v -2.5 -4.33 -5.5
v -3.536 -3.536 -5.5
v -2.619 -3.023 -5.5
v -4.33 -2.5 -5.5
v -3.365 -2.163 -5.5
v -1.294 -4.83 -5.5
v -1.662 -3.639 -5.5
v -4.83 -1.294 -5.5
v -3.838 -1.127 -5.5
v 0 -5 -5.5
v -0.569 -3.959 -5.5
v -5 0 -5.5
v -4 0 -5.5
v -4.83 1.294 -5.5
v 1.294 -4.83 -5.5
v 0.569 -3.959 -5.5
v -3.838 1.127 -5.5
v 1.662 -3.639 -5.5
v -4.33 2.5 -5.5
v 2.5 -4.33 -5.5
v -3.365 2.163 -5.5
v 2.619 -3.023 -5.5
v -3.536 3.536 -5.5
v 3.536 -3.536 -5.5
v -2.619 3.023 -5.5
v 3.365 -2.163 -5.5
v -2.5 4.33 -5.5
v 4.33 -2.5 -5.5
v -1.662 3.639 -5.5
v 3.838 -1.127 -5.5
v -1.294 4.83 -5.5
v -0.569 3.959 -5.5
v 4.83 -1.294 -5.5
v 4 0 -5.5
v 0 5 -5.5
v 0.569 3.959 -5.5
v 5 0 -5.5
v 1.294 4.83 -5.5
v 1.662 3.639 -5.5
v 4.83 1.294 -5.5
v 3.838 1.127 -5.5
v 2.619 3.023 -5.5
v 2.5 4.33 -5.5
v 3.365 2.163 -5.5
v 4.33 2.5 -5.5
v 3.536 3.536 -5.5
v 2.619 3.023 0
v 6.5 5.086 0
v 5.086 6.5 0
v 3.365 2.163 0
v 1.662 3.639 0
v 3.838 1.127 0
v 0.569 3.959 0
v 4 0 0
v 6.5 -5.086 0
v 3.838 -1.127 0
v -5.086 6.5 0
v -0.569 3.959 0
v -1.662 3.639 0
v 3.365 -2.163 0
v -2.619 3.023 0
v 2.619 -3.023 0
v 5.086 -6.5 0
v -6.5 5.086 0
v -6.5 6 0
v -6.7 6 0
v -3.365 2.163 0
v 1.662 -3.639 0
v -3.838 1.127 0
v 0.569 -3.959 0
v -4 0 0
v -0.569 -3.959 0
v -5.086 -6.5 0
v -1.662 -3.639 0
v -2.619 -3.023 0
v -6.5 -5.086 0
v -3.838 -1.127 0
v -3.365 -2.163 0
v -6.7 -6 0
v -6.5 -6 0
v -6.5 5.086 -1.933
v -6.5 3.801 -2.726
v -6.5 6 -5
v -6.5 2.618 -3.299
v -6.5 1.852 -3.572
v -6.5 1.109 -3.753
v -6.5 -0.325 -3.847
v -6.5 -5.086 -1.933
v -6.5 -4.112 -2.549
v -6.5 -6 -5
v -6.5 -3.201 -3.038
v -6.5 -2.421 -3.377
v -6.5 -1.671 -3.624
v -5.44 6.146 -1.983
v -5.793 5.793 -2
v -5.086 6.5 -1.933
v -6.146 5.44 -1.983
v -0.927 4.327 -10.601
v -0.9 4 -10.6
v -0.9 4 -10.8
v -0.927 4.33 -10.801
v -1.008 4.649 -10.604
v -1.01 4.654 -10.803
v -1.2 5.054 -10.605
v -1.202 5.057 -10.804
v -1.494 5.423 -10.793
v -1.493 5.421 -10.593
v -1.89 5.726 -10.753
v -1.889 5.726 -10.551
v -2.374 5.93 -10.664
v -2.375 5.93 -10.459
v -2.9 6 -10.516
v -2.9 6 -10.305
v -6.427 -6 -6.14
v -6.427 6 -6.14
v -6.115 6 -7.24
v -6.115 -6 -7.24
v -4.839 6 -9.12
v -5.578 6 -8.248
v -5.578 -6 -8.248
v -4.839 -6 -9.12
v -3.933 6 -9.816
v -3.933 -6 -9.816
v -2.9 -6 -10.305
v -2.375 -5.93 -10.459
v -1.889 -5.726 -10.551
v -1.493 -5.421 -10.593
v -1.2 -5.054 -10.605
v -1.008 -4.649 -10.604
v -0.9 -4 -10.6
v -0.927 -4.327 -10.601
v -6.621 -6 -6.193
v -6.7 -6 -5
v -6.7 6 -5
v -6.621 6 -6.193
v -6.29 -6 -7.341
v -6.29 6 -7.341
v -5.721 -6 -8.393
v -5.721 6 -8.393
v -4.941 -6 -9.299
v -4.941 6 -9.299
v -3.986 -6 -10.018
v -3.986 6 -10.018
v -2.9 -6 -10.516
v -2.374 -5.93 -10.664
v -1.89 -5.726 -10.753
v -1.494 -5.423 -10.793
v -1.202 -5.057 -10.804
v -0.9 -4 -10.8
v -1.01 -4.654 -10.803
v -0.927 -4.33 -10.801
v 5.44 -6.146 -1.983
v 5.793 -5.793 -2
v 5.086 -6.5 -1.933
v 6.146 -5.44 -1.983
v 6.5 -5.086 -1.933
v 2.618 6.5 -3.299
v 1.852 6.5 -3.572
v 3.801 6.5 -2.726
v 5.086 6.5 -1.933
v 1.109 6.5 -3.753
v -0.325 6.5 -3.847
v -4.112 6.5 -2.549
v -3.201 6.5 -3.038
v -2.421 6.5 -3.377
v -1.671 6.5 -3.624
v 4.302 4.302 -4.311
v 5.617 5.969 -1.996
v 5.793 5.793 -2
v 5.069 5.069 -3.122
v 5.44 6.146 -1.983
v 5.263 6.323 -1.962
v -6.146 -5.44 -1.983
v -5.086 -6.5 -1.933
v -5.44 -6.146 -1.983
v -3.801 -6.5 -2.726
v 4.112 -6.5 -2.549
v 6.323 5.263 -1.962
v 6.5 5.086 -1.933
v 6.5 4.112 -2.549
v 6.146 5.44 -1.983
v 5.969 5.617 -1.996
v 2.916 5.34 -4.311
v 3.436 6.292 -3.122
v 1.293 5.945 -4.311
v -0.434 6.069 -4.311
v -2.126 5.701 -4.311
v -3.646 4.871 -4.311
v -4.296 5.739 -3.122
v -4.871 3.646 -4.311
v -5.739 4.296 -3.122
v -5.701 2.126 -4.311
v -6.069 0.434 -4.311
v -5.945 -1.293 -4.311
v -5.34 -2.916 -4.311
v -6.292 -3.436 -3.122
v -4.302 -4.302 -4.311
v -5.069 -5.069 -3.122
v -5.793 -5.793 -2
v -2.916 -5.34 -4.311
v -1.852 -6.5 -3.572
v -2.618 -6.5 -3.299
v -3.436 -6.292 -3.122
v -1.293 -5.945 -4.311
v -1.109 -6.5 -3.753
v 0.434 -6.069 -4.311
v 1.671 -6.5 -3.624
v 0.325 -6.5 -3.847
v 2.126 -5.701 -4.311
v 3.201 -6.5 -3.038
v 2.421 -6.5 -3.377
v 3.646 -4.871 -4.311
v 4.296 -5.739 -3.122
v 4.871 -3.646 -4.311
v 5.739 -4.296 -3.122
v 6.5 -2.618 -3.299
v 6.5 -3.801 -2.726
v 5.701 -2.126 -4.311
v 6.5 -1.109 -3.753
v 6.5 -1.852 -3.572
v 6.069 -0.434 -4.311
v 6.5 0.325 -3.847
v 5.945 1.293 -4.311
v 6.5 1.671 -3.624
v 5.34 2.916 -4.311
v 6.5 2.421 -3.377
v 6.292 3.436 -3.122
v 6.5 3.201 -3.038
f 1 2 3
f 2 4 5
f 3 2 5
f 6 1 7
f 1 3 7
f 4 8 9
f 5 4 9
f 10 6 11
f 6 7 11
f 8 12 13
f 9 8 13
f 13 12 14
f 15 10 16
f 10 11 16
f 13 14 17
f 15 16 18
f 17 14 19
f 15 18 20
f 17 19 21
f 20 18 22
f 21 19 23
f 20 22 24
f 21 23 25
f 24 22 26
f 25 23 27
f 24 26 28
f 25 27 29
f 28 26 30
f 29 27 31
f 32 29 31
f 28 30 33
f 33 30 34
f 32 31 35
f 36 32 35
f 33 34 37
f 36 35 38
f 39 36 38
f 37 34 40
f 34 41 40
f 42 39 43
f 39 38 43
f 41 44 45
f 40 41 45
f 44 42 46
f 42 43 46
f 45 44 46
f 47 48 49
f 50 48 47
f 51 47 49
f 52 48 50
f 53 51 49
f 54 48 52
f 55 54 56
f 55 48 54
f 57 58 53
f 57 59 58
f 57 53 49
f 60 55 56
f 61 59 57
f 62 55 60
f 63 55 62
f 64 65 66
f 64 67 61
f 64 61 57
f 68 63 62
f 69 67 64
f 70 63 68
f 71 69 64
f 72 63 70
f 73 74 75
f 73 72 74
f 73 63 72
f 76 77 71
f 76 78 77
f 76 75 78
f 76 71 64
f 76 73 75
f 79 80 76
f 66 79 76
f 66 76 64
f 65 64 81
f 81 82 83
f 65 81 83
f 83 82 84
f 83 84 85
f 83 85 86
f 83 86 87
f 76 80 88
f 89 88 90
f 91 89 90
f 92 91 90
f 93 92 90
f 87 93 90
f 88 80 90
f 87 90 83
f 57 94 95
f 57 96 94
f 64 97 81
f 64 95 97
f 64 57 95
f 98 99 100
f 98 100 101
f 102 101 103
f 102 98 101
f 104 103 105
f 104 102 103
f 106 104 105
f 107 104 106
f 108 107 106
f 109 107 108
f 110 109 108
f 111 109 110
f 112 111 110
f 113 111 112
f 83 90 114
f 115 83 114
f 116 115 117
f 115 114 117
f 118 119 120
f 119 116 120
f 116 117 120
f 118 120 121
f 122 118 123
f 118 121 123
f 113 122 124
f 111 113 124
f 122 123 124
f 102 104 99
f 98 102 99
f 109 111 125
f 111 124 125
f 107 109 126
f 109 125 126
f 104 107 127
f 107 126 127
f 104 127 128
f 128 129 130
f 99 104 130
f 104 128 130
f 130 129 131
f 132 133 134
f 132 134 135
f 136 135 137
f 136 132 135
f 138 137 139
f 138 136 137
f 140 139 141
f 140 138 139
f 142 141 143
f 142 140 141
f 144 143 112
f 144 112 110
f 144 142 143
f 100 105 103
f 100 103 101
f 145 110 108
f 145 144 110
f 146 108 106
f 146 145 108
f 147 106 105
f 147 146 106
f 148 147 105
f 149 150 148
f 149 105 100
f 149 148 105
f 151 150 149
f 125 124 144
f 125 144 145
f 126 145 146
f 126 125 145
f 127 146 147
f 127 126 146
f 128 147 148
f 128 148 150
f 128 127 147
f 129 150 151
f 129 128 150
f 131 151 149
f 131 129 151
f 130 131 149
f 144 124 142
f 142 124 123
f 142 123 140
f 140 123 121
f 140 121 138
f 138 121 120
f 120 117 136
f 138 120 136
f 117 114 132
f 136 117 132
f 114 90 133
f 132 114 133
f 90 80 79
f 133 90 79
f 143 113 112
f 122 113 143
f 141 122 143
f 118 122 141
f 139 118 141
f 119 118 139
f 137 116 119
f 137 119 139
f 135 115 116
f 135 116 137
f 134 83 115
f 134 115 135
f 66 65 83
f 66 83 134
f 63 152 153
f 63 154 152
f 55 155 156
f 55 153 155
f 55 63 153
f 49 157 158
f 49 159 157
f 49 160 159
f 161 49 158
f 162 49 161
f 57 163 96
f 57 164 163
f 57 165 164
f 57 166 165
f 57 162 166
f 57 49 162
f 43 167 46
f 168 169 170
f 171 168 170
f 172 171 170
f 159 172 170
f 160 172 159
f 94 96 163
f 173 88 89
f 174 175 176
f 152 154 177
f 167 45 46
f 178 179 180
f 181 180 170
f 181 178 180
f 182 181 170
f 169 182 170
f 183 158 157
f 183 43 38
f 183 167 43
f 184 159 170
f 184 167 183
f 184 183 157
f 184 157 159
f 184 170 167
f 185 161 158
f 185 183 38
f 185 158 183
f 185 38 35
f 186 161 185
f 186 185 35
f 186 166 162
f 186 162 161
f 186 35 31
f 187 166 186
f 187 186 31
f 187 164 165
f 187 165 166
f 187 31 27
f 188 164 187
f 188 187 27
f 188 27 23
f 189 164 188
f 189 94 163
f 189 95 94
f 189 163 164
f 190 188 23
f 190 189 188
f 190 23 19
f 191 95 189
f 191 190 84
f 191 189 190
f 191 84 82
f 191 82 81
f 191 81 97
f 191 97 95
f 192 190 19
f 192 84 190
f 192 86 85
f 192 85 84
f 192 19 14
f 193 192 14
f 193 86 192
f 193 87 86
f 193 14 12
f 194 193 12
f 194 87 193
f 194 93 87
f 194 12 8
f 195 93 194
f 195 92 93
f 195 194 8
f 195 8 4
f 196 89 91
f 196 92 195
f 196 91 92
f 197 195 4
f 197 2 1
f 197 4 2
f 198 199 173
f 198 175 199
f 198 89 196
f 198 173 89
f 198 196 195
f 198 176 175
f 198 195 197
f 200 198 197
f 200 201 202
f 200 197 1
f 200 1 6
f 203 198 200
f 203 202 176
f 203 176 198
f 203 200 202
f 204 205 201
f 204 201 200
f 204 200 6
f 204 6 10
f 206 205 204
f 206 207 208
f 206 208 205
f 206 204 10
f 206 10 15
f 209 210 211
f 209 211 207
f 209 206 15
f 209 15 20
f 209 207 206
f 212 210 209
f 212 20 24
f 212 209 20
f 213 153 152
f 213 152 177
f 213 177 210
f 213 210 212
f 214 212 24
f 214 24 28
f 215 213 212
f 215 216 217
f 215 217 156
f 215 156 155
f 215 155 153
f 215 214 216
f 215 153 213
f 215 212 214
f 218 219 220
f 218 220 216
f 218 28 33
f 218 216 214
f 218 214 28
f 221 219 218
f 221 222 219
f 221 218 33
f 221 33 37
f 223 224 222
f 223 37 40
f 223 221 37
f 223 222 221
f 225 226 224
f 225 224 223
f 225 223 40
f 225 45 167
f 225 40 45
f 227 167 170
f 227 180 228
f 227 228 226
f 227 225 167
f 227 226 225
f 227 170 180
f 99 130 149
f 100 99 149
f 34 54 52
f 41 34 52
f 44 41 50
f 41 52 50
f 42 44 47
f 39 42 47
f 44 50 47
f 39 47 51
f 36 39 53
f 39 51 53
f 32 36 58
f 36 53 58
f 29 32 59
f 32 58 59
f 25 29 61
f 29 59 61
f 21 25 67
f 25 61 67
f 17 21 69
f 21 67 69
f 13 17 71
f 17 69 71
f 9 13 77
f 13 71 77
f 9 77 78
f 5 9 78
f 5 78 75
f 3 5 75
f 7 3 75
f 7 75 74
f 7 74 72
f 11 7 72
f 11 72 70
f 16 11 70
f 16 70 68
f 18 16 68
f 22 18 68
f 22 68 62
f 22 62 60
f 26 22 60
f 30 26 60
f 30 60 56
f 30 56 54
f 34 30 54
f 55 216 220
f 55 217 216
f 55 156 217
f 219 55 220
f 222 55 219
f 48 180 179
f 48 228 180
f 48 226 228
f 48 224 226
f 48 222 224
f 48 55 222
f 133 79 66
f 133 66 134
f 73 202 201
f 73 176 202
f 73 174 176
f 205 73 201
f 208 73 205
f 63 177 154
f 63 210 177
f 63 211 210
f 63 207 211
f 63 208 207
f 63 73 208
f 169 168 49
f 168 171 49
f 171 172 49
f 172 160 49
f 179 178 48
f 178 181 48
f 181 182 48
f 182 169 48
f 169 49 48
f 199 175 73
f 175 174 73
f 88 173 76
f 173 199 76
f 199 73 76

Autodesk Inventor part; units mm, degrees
ref_plane "YZ Plane" through (0, 0, 0) normal (1, 0, 0) x (0, 1, 0)
ref_plane "XZ Plane" through (0, 0, 0) normal (0, 1, 0) x (-1, 0, 0)
sketch "Sketch2" plane through (0, 0, 0) normal (0, 0, 1) x (1, 0, 0)
  line L0 (-5.0858, -6.5) -> (5.0858, -6.5)
  line L1 (6.5, -5.0858) -> (6.5, 5.0858)
  line L2 (5.0858, 6.5) -> (-5.0858, 6.5)
  line L3 (-6.5, 5.0858) -> (-6.5, -5.0858)
  line L4 (-6.5, 6.5) -> (6.5, -6.5) construction
  circle A0 centre (0, 0) radius 4
  line L5 (5.0858, 6.5) -> (6.5, 5.0858)
  line L6 (0, -6.5) -> (0, 6.5) construction
  line L7 (-6.5, 0) -> (6.5, 0) construction
  line L8 (-5.0858, 6.5) -> (-6.5, 5.0858)
  line L9 (5.0858, -6.5) -> (6.5, -5.0858)
  line L10 (-5.0858, -6.5) -> (-6.5, -5.0858)
  dimension "THREAD" = 8
  dimension "d3" = 45
  dimension "d4" = 2
extrude "Extrusion1" add sketch "Sketch2" against normal blind 5.5
ref_plane "Work Plane1" through (-5.7929, -5.7929, -5.5) normal (0.7071068, -0.7071068, 0) x (0.7071068, 0.7071068, 0)
sketch "Sketch4" plane through (-5.7929, -5.7929, -5.5) normal (0.7071068, -0.7071068, 0) x (0.7071068, 0.7071068, 0)
  line L0 (12.1924, 0) -> (4.1924, 0) projected
  line L1 (8.1924, 0) -> (13.1924, 0)
  line L2 (16.3848, 5.5) -> (16.3848, 3.5)
  line L3 (13.1924, 0) -> (16.7968, 3.9518)
  line L4 (13.1924, 0) -> (16.3848, 0)
  line L5 (16.3848, 3.5) -> (16.3848, 0)
  line L6 (16.7968, 3.9518) -> (16.7968, -0.4121)
  line L7 (16.7968, -0.4121) -> (13.1924, -0.4121)
  line L8 (13.1924, -0.4121) -> (13.1924, 0)
  line L9 (8.1924, 5.5) -> (8.1924, 0)
  line L10 (16.3848, 5.5) -> (16.3848, 0) projected
  line L11 (16.3848, 3.5) -> (17.5015, 3.5) construction
  line L12 (9.1924, 5.5) -> (16.3848, 5.5) construction
  dimension "d10" = 5
  dimension "d15" = 2
revolve "Revolution1" cut sketch "Sketch4" angle 360 about axis through (0, 0, 0) along (0, 0, -1)
thread "Thread1" size "M8x1.25" class "6H" standard "ANSI Metric M Profile" full length
sketch "Sketch6" plane through (-3.5464, 0, 2.5351) normal (0, 1, 0) x (-1, 0, 0)
  line L0 (2.9536, -2.5351) -> (2.9536, 6.0056)
  line L1 (2.9536, -2.5351) -> (2.9536, -7.5351)
  arc A0 (-2.6464, -13.1351) -> (2.9536, -7.5351) centre (-2.4158, -7.7657) ccw
  line L2 (2.9536, -2.5351) -> (3.1536, -2.5351)
  line L3 (3.1536, -2.5351) -> (3.1536, -7.5351)
  line L4 (-2.6464, -13.1351) -> (-2.6464, -13.3351)
  arc A1 (-2.6464, -13.3351) -> (3.1536, -7.5351) centre (-2.4158, -7.7657) ccw
  line L5 (2.9536, 0) -> (2.9536, -1.9333)
  line L6 (-5.0858, -2.5351) -> (5.0858, -2.5351)
  line L7 (-8.6322, -2.5351) -> (1.5394, -2.5351) projected
  line L8 (2.9536, -2.5351) -> (2.9536, -4.4684) projected
  point P0 (0, 0)
  point P1 (-15.0649, 7.0019)
  dimension "d25" = 5
  dimension "d23" = 0.2
  dimension "d22" = 0.2
  dimension "d21" = 10.8
  dimension "d24" = 5.3743
extrude "Extrusion3" add sketch "Sketch6" along normal mid plane 12
fillet "Fillet2" radius 2 2 edges at (-0.9, -6, -10.7) (-0.9, 6, -10.7)
properties part number "21.1351/2" material "Steel, Mild"
